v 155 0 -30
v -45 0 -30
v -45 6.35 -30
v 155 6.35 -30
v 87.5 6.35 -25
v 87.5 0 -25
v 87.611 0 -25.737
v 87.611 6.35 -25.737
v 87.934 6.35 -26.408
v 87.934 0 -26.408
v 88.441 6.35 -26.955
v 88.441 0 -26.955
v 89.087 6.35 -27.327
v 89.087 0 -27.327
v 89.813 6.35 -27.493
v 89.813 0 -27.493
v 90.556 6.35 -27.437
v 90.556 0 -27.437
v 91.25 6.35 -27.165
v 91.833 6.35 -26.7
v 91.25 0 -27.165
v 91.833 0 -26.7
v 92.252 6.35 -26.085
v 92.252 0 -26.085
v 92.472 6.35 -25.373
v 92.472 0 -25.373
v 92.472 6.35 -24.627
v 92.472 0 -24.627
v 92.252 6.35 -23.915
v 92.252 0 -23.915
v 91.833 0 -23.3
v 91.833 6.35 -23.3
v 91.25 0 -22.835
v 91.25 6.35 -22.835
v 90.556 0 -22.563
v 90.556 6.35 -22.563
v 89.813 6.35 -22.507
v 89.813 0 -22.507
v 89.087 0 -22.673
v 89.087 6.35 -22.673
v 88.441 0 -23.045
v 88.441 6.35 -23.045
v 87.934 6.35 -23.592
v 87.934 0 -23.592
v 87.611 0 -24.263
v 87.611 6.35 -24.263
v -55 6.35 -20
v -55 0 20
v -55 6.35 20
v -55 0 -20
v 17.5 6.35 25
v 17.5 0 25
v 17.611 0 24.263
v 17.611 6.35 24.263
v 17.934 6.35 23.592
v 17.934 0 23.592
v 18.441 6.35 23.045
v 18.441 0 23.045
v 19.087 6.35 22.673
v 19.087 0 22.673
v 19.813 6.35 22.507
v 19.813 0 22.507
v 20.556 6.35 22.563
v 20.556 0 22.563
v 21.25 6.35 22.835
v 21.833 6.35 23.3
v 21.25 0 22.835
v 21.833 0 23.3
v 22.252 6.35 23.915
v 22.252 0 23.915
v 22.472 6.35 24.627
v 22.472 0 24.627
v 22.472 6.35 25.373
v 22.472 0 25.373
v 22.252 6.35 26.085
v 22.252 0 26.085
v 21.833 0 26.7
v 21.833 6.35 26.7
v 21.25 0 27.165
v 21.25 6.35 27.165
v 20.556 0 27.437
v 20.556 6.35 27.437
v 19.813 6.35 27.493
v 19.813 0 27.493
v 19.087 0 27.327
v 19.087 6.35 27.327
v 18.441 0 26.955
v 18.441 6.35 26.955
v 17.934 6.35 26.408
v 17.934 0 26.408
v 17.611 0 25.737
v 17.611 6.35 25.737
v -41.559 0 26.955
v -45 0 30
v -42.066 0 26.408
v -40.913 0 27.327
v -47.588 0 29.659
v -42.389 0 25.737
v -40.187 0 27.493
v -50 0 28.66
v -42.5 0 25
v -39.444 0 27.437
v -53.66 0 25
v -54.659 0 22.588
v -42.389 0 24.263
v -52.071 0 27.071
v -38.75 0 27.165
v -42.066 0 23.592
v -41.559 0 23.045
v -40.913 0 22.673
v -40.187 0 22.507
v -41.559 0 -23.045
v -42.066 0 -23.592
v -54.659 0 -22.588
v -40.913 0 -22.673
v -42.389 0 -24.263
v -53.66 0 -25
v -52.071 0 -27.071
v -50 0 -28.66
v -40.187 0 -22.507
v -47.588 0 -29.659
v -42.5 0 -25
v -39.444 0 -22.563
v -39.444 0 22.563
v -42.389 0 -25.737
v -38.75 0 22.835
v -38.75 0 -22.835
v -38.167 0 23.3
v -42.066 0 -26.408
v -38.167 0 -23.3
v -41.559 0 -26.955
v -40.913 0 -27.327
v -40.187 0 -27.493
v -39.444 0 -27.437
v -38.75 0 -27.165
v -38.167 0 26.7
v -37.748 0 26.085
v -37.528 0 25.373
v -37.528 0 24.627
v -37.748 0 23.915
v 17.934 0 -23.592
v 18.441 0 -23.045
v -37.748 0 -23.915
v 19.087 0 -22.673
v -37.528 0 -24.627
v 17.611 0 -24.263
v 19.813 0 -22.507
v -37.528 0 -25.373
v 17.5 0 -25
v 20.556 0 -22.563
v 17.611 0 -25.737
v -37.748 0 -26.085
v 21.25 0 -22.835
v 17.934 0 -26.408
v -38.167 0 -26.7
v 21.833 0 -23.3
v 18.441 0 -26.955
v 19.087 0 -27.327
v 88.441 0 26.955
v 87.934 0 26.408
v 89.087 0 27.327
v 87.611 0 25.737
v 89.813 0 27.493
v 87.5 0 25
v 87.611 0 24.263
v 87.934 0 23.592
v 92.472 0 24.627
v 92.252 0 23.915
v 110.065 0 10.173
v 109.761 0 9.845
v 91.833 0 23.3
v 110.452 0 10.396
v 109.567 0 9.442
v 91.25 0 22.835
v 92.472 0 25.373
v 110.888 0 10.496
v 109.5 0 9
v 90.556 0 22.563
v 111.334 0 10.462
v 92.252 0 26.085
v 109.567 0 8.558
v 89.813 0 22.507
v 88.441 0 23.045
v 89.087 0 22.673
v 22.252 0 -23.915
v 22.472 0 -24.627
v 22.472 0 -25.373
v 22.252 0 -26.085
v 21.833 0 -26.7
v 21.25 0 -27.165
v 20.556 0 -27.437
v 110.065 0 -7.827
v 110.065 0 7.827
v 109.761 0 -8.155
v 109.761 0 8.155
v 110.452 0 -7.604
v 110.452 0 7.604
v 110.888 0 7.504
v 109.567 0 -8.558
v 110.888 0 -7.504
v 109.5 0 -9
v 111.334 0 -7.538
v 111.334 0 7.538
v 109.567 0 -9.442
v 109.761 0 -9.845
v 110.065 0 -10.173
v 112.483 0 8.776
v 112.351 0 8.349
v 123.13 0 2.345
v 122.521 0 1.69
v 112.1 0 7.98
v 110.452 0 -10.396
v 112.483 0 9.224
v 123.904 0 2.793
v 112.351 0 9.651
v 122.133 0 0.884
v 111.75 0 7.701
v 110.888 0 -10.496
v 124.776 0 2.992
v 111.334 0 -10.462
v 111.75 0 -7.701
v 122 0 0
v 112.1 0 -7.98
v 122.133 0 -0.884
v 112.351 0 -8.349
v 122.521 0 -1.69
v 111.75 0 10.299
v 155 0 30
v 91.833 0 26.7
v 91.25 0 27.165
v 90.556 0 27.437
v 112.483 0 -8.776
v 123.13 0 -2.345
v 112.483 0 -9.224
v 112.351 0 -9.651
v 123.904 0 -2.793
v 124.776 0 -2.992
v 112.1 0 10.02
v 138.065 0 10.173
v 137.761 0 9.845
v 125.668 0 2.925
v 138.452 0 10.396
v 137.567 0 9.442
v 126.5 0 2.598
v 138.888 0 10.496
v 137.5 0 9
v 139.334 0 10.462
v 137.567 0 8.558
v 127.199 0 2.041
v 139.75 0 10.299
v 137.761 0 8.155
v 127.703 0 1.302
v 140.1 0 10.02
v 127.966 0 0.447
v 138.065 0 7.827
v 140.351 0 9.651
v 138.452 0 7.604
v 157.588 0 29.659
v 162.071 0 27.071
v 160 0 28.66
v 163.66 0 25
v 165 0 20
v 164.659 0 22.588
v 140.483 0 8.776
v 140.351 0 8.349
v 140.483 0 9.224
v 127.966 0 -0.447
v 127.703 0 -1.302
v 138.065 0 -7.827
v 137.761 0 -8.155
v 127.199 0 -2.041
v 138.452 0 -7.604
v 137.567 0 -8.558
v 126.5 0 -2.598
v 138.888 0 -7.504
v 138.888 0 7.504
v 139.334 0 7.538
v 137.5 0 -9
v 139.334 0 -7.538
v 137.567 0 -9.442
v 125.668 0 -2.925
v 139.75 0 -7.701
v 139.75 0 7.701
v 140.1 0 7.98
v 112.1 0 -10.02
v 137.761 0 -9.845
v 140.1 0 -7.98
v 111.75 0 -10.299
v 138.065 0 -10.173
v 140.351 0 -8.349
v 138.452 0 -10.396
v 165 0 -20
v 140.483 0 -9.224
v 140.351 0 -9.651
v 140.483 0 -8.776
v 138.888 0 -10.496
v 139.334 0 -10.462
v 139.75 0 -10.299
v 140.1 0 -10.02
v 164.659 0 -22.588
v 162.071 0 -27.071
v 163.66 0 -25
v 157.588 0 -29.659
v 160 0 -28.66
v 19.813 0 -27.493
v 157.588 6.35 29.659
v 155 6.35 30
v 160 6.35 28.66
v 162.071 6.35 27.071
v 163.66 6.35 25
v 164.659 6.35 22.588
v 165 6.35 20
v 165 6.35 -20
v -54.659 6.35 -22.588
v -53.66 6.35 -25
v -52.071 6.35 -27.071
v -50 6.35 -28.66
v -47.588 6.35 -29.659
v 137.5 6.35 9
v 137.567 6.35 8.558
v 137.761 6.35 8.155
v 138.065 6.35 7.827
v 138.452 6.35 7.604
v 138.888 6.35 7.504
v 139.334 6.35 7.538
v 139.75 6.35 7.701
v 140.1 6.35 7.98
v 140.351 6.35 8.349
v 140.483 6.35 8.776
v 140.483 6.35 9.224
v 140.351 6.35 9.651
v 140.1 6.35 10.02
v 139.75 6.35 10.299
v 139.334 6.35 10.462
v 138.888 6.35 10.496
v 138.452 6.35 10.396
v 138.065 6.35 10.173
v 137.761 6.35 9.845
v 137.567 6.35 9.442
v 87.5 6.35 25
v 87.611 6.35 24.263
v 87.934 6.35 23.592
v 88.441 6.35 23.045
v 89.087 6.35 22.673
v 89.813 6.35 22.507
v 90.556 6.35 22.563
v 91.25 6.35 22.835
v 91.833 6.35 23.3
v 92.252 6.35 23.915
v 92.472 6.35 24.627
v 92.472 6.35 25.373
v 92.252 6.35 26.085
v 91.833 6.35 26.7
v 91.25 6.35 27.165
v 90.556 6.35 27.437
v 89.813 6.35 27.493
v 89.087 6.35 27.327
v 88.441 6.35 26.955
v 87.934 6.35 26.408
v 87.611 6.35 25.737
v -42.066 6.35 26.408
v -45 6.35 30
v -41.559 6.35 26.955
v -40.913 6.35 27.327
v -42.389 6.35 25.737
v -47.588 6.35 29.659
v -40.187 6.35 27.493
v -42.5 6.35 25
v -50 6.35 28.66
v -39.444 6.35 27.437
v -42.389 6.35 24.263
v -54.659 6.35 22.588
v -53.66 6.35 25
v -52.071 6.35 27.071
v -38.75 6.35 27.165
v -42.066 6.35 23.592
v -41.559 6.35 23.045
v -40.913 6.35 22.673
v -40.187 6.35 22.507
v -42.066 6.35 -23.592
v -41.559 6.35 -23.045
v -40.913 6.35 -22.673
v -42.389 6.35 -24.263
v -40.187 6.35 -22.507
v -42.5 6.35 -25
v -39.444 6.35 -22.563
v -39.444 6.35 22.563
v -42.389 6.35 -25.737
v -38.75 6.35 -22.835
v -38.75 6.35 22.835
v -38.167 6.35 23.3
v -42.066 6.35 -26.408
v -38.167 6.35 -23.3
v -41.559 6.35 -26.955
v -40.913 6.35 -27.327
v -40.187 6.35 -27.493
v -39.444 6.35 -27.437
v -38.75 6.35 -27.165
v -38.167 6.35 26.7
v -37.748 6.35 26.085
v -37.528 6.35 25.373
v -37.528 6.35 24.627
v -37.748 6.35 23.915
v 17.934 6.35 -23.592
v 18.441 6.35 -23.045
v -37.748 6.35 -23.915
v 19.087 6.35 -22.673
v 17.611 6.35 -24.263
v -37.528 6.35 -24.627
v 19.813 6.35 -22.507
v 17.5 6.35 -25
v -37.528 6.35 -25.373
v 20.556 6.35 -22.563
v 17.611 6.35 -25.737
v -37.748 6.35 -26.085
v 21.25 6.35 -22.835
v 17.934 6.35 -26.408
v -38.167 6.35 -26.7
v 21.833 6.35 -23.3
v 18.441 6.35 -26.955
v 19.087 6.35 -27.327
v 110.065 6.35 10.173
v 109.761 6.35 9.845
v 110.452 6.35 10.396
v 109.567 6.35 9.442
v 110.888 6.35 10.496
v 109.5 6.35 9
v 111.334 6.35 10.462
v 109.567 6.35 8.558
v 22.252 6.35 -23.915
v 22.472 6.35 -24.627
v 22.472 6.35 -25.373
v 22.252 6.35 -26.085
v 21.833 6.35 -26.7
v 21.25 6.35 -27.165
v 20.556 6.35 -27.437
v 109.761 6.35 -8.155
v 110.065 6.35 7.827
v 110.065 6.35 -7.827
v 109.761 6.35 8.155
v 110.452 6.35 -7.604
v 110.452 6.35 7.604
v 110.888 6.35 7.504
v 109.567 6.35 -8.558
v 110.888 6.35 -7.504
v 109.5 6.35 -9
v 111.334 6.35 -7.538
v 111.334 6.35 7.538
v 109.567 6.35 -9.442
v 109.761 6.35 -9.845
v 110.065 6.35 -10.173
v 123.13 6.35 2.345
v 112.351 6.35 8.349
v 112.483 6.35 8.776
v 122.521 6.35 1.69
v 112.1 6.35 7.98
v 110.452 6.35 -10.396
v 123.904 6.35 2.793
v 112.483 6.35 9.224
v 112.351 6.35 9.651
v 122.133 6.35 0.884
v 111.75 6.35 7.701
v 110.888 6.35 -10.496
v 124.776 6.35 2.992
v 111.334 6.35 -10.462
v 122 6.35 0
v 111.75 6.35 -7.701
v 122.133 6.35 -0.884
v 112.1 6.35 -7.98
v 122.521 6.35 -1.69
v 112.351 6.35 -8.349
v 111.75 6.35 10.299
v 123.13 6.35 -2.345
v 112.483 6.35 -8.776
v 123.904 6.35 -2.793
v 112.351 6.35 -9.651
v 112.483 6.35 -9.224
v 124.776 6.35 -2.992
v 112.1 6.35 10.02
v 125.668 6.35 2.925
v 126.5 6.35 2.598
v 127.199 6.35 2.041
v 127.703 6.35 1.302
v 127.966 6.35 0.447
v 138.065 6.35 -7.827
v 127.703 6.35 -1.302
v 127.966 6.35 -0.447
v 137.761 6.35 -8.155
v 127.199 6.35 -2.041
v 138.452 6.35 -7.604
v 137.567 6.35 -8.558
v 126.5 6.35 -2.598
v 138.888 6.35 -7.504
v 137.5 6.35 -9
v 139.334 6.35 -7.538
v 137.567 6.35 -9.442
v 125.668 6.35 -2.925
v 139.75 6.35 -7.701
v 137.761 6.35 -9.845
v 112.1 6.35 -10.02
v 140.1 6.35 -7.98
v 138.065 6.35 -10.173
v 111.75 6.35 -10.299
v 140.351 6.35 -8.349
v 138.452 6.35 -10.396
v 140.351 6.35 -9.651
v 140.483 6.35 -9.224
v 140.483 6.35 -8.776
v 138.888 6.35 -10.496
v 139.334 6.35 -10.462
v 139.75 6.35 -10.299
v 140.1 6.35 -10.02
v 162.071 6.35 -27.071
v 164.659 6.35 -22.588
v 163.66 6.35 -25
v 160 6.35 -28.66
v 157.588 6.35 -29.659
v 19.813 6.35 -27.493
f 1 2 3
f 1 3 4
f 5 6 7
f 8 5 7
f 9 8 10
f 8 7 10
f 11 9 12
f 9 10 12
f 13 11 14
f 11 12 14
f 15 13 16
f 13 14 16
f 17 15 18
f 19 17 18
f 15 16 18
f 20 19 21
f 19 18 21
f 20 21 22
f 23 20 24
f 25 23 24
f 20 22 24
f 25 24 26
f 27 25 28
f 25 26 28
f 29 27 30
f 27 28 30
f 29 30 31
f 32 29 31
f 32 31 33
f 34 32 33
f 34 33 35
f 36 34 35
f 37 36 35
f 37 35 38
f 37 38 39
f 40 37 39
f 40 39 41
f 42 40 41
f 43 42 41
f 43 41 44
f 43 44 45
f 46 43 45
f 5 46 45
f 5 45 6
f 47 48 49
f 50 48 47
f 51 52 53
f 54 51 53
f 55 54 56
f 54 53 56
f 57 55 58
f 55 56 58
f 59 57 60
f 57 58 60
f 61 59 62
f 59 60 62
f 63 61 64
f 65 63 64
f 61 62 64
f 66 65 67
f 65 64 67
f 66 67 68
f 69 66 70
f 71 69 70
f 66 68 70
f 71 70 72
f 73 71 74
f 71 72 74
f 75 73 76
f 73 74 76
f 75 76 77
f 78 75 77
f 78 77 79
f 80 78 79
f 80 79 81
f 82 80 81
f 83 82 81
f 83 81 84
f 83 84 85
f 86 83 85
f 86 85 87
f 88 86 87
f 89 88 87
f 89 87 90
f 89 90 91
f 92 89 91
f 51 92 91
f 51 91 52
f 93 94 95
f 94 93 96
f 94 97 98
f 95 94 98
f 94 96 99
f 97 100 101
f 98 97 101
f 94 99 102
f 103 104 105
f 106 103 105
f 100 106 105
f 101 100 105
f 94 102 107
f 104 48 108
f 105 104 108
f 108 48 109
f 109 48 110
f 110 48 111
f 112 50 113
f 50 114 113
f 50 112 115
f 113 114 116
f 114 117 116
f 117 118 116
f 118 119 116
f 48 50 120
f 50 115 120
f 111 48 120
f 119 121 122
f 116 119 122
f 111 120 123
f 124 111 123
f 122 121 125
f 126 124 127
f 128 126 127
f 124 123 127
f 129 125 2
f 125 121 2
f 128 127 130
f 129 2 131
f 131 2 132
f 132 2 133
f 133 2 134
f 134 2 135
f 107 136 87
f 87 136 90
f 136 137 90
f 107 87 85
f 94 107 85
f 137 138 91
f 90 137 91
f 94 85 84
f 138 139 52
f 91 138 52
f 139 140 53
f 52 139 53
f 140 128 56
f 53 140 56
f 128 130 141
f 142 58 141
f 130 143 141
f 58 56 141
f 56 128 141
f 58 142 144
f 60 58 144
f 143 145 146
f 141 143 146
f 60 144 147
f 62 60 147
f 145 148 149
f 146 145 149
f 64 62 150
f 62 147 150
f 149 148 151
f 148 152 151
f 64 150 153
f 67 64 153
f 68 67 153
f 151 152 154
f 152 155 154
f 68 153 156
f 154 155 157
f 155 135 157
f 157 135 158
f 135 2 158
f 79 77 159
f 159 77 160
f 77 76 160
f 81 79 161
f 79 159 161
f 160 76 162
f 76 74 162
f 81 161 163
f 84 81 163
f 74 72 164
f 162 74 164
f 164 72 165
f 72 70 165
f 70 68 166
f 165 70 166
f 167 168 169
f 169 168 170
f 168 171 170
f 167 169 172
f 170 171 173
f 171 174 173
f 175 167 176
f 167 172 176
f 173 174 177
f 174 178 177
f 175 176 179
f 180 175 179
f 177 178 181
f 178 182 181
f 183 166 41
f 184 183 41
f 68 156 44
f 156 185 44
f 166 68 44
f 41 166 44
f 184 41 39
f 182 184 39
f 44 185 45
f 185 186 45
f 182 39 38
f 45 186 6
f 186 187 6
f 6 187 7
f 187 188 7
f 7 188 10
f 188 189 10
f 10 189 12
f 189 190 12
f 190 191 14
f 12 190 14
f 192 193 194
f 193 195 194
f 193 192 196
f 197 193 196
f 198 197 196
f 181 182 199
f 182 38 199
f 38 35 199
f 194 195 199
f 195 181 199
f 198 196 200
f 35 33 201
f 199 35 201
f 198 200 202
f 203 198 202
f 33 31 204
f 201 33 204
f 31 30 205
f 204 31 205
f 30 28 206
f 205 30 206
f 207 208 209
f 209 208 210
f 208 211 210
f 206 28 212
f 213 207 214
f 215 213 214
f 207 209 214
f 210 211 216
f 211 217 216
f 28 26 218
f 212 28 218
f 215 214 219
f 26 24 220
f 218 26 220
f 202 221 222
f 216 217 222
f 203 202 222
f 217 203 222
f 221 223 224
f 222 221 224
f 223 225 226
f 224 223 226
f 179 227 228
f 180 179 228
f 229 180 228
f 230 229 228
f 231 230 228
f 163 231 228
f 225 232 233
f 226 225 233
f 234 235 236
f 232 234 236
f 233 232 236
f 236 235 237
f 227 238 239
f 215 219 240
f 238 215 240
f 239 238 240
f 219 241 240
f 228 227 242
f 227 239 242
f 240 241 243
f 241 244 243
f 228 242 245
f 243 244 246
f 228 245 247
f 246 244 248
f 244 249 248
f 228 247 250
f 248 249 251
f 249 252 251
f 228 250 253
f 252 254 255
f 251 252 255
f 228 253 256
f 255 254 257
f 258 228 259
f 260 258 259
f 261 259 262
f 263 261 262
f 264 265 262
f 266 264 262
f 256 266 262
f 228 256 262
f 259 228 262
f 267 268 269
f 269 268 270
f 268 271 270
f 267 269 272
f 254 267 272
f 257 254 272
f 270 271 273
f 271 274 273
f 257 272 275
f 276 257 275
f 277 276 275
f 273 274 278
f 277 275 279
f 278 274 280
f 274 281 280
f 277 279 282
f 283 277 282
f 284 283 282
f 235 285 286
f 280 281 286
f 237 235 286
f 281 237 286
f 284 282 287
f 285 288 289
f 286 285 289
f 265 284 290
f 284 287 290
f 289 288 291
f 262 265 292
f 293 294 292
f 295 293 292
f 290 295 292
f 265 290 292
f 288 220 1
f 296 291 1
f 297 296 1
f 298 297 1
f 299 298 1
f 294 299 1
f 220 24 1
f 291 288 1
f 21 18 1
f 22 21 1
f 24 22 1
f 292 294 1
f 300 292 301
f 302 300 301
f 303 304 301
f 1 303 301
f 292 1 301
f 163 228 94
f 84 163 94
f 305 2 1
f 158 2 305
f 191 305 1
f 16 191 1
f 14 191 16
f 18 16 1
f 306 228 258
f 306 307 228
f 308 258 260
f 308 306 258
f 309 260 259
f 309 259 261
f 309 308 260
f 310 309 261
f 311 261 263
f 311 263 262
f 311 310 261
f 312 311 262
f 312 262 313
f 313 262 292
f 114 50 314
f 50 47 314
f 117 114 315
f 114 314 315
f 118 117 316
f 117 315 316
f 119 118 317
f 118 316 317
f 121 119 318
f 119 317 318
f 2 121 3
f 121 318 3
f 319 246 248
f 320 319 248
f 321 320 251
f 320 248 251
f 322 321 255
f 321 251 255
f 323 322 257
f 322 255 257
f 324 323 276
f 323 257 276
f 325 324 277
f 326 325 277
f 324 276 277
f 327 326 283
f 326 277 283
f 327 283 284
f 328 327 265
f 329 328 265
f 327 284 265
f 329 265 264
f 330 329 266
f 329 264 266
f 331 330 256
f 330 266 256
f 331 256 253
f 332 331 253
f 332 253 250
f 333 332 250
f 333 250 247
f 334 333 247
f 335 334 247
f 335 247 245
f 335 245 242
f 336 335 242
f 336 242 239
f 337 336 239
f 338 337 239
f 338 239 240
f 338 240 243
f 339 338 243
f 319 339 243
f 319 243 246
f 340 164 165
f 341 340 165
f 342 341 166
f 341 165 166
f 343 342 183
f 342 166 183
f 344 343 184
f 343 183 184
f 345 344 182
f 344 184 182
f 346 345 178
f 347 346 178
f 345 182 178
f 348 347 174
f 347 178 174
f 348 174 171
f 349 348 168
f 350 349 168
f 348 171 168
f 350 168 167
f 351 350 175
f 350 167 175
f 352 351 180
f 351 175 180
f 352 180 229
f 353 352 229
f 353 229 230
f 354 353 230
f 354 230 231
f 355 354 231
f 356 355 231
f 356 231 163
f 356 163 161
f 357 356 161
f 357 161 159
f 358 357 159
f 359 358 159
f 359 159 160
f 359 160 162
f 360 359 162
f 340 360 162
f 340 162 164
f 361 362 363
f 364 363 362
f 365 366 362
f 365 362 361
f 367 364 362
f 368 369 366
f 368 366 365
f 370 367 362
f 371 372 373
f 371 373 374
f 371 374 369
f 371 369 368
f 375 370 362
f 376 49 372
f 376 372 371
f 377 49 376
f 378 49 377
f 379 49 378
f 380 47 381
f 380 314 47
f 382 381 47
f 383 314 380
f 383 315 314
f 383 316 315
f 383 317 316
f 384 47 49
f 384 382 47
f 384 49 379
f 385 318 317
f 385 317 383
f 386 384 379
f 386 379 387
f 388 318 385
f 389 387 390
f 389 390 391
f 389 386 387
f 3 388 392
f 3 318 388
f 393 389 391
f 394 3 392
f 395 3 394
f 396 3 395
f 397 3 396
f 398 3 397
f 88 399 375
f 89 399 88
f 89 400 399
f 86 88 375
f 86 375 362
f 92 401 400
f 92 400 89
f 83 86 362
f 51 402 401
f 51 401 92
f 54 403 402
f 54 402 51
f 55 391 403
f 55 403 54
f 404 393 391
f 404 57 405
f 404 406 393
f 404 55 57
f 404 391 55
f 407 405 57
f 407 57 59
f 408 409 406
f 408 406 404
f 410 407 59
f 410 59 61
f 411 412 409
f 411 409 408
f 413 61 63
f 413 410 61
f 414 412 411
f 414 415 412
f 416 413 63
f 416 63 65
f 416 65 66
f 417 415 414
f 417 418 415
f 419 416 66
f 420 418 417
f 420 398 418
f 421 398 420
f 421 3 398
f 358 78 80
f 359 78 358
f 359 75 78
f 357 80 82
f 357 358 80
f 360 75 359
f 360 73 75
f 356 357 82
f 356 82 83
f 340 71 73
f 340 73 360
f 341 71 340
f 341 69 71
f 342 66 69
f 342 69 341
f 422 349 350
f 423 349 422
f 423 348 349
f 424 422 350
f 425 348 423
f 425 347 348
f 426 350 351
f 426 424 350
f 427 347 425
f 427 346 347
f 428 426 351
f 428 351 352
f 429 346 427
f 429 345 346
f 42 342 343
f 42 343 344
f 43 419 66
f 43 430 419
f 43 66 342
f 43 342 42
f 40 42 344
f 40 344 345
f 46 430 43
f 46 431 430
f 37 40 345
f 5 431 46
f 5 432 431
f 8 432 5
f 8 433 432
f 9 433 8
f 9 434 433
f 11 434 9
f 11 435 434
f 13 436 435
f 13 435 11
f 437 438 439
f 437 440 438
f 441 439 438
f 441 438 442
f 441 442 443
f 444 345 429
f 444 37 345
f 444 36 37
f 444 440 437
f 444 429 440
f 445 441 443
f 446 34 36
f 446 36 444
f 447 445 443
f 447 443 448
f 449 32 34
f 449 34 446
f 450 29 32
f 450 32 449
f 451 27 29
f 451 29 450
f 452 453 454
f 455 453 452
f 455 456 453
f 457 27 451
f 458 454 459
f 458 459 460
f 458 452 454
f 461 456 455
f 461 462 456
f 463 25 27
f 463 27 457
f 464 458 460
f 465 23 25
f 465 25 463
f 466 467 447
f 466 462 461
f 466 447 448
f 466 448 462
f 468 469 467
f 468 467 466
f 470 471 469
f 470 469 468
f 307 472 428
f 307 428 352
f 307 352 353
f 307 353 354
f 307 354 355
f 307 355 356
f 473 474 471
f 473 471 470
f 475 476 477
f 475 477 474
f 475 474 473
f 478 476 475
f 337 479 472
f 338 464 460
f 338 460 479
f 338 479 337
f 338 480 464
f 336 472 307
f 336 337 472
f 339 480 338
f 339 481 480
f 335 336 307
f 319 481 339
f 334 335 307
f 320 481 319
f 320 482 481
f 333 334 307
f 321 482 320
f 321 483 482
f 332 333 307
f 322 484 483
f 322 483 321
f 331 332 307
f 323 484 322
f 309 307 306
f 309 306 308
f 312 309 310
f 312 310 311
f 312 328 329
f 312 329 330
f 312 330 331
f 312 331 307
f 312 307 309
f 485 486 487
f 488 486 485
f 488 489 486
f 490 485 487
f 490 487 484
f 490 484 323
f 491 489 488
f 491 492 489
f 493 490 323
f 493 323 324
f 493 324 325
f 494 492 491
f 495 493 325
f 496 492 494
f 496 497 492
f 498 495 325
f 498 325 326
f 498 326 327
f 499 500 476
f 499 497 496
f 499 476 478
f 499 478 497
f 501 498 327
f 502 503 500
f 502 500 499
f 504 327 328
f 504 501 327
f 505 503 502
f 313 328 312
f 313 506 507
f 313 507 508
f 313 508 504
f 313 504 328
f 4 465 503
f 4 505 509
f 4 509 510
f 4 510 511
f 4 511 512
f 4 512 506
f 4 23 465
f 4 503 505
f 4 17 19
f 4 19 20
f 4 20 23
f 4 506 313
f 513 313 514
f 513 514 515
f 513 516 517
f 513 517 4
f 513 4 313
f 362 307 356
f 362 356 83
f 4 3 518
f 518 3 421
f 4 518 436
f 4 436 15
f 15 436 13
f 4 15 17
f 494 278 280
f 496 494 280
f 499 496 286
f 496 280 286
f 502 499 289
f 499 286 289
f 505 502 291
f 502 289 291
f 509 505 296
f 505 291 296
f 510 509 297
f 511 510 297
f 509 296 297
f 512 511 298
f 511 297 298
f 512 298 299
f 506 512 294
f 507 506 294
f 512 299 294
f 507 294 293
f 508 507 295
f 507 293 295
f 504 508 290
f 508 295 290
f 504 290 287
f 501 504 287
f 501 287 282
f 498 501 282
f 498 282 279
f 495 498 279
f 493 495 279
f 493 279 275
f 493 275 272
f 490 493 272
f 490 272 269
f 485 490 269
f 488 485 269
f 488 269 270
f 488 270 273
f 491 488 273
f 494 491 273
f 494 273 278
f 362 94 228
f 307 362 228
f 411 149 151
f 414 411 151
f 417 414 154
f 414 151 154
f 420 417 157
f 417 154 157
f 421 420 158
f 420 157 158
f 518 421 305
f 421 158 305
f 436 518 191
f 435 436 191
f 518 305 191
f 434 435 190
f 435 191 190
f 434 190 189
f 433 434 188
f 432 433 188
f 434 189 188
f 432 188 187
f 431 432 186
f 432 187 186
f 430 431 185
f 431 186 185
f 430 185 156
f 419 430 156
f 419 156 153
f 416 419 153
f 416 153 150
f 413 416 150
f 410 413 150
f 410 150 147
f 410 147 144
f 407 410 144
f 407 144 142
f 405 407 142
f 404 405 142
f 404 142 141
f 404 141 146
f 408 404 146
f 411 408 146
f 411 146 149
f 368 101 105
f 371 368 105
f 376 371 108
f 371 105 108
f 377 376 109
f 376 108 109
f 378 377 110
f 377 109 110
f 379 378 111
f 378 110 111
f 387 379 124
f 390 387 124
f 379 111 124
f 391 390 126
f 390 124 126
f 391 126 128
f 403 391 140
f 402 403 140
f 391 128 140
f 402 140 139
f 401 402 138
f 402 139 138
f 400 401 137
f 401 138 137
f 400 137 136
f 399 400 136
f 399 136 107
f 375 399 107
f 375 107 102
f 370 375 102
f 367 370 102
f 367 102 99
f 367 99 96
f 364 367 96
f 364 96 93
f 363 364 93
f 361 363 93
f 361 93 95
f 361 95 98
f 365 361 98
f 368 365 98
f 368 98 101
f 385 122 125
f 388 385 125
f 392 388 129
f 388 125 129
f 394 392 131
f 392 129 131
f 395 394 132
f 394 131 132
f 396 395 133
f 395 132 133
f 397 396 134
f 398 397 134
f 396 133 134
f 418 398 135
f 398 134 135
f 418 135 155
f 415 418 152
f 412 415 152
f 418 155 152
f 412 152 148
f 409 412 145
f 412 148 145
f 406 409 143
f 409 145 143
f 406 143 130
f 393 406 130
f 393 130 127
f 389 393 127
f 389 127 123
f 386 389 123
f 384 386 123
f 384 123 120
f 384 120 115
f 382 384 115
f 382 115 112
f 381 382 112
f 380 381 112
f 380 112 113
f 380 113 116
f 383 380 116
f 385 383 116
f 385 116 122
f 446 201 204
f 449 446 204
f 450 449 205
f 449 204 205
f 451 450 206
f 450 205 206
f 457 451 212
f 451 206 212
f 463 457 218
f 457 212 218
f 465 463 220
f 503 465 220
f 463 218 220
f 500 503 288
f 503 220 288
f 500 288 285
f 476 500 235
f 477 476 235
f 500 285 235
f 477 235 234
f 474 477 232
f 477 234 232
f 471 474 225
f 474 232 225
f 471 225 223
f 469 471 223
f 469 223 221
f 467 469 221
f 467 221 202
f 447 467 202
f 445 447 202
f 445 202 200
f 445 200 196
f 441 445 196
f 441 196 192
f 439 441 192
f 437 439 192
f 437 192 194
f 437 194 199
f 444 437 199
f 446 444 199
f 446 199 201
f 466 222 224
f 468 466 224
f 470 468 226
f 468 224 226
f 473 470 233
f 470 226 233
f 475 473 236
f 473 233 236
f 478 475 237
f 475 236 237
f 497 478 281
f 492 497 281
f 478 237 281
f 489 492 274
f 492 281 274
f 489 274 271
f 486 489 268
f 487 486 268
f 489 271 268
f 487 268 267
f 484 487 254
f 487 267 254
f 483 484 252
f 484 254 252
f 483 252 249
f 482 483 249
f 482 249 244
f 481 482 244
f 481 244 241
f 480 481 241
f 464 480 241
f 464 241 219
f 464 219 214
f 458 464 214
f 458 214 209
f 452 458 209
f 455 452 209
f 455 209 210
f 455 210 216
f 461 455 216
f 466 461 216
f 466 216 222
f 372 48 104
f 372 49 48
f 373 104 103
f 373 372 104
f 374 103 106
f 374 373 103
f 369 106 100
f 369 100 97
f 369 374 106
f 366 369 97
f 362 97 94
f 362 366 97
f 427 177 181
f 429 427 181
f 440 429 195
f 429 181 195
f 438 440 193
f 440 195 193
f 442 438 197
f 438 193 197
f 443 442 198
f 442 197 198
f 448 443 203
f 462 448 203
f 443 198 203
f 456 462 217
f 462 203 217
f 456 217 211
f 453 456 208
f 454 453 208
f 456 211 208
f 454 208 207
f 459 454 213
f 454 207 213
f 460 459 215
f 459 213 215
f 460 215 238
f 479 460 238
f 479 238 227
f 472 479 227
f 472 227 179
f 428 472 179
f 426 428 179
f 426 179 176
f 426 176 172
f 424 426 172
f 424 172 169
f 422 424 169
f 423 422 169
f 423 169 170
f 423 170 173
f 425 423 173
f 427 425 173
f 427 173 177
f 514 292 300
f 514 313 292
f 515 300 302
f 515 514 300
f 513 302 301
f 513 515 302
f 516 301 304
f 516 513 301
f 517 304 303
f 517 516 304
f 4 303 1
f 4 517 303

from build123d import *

# Parameters (mm, degrees)
SKETCH1_W             = 220
SKETCH1_H             = 60
BOSS_EXTRUDE1_DEPTH   = 6.35
FILLET1_R             = 10
F_6_0MM_DOWEL_HOLE1_D = 6
F_3_0MM_DOWEL_HOLE1_D = 3
F_5_0MM_DOWEL_HOLE1_D = 5


with BuildPart() as part:
    # Sketch1 → Boss-Extrude1 (new body)
    with BuildSketch(Plane(origin=(0, 0, 0), x_dir=(1, 0, 0), z_dir=(0, 1, 0))):
        with Locations((55, 0)):
            Rectangle(SKETCH1_W, SKETCH1_H)
    extrude(amount=BOSS_EXTRUDE1_DEPTH)

    # Fillet1
    fillet1_edges = [part.edges().sort_by_distance(p)[0] for p in [
        (-55, 3.175, -30),
        (165, 3.175, -30),
        (165, 3.175, 30),
        (-55, 3.175, 30),
    ]]
    fillet(fillet1_edges, radius=FILLET1_R)

    # Ø6.0mm Dowel Hole1 (through all)
    with Locations(Plane(origin=(0, 6.35, 0), x_dir=(1, 0, 0), z_dir=(0, 1, 0))):
        with Locations((125, 0)):
            Hole(F_6_0MM_DOWEL_HOLE1_D / 2)

    # Ø3.0mm Dowel Hole1 (through all)
    with Locations(Plane(origin=(0, 6.35, 0), x_dir=(1, 0, 0), z_dir=(0, 1, 0))):
        with Locations((139, -9), (111, -9), (111, 9), (139, 9)):
            Hole(F_3_0MM_DOWEL_HOLE1_D / 2)

    # Ø5.0mm Dowel Hole1 (through all)
    with Locations(Plane(origin=(0, 6.35, 0), x_dir=(1, 0, 0), z_dir=(0, 1, 0))):
        with Locations((20, -25), (90, -25), (90, 25), (20, 25), (-40, -25), (-40, 25)):
            Hole(F_5_0MM_DOWEL_HOLE1_D / 2)


solid = part.part
